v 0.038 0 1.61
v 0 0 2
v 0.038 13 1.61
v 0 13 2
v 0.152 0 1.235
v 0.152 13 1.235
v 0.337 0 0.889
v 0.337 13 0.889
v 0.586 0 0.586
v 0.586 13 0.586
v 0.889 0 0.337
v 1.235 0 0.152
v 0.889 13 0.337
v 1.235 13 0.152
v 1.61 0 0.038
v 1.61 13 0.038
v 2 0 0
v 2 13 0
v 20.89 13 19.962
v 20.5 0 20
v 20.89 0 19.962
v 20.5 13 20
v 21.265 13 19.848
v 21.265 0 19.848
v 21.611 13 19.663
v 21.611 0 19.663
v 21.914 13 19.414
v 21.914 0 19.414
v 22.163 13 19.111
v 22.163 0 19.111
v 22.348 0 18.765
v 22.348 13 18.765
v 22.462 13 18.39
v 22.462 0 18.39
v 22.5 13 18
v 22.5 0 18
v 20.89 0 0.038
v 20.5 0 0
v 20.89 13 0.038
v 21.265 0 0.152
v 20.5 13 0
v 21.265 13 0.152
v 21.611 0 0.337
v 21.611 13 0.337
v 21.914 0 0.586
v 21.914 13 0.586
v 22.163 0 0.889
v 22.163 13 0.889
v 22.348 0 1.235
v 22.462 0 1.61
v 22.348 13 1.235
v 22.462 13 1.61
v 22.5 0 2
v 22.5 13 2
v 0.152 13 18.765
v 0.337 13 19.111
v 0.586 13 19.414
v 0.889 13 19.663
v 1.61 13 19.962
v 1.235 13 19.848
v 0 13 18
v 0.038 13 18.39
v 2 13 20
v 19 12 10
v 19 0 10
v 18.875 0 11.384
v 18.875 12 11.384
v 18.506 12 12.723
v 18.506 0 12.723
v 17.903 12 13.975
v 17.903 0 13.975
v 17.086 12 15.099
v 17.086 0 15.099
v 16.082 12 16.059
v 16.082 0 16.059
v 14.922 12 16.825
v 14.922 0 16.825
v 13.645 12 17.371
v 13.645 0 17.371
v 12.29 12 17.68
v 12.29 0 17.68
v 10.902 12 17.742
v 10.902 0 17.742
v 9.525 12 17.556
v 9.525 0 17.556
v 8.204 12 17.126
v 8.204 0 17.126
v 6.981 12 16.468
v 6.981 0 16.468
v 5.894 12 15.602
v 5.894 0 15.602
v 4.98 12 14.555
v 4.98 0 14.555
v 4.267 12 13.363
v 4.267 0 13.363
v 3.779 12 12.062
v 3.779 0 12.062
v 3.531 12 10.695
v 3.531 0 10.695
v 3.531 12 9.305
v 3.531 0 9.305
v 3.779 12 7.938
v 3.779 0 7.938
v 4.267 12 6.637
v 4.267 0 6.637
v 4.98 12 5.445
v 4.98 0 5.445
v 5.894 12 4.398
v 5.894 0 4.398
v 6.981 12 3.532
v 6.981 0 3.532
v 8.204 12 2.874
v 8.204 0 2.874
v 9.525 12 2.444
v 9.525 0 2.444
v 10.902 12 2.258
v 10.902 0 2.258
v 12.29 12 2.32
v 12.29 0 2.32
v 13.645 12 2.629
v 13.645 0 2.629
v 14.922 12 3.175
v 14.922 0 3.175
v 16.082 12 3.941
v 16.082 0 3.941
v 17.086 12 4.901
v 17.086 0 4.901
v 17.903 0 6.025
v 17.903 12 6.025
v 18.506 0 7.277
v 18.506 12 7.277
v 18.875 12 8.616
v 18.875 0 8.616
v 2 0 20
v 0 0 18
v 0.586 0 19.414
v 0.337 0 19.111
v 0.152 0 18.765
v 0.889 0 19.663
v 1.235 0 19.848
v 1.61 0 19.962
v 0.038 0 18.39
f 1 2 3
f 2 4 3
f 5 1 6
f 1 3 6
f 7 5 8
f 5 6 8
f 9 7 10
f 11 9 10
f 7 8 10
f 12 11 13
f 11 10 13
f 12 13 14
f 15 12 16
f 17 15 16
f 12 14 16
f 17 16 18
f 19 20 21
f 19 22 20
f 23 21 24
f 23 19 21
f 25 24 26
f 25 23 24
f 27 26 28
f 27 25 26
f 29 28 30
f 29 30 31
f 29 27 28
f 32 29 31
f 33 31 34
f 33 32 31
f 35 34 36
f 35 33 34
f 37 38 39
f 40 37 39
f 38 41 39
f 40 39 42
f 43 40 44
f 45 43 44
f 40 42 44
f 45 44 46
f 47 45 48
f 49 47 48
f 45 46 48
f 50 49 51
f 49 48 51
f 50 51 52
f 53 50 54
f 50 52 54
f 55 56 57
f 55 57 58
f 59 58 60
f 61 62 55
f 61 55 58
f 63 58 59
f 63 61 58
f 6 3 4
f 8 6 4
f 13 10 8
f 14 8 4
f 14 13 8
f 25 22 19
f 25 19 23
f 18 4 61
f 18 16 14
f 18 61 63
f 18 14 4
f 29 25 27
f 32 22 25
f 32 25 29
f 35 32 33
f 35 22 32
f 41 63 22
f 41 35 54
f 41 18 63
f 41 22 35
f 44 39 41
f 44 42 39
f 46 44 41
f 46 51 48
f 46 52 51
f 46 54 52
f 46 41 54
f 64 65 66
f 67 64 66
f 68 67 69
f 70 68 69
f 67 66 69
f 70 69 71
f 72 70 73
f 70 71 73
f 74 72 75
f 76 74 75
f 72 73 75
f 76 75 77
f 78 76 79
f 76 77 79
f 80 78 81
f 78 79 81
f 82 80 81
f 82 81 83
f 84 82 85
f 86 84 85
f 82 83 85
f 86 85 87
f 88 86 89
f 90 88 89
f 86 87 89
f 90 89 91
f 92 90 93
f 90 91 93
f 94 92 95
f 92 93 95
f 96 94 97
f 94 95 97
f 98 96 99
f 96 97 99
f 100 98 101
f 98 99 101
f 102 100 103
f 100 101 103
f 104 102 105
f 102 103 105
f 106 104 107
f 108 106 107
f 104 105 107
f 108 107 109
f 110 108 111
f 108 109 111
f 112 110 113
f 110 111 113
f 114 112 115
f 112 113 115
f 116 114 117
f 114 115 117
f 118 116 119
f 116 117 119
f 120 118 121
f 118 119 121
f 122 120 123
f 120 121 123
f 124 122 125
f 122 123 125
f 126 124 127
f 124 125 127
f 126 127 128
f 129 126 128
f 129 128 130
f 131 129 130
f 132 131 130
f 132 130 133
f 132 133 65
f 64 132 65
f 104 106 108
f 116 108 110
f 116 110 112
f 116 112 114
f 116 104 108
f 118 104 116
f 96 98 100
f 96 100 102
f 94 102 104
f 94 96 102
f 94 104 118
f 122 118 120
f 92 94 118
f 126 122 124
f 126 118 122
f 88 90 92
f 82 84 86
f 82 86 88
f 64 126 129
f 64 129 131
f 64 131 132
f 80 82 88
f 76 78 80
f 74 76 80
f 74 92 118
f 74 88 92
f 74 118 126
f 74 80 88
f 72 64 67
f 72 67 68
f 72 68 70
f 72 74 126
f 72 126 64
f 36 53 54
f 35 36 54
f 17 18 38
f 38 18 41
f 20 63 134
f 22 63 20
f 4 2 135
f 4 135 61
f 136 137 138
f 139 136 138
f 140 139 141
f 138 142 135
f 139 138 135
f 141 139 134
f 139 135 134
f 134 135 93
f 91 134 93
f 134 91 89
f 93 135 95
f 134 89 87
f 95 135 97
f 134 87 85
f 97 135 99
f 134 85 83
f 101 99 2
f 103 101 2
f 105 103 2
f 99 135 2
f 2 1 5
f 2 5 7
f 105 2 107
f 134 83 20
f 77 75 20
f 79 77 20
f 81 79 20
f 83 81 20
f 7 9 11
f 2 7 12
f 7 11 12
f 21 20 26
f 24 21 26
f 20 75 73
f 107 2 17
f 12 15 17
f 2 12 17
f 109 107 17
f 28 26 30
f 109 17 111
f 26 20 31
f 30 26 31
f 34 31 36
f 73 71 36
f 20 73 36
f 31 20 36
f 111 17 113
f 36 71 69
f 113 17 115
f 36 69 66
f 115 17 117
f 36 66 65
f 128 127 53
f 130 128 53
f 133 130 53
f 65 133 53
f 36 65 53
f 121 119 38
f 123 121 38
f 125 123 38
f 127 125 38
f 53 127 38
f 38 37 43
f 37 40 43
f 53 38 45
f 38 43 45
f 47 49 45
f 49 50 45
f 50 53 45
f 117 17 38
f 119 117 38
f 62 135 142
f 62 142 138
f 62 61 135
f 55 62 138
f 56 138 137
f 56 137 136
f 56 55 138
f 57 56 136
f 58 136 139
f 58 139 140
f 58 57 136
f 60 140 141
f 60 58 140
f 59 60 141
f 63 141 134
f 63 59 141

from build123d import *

# Parameters (mm, degrees)
F0_W     = 22.5
F0_H     = 13
F1_DEPTH = 20
F2_R     = 7.75
F3_DEPTH = 12
F4_R     = 2


with BuildPart() as f1:
    # F0 (on Top) → F1 (new body)
    with BuildSketch(Plane.XY):
        with Locations((11.25, 6.5)):
            Rectangle(F0_W, F0_H)
    extrude(amount=F1_DEPTH)

    # F2 (on face) → F3 (cut)
    with BuildSketch(Plane.XZ):
        with Locations((11.25, 10)):
            Circle(F2_R)
    extrude(amount=-F3_DEPTH, mode=Mode.SUBTRACT)

    # F4
    f4_edges = [f1.edges().sort_by_distance(p)[0] for p in [
        (22.5, 6.5, 20),
        (22.5, 6.5, 0),
        (0, 6.5, 20),
        (0, 6.5, 0),
    ]]
    fillet(f4_edges, radius=F4_R)


solid = f1.part
